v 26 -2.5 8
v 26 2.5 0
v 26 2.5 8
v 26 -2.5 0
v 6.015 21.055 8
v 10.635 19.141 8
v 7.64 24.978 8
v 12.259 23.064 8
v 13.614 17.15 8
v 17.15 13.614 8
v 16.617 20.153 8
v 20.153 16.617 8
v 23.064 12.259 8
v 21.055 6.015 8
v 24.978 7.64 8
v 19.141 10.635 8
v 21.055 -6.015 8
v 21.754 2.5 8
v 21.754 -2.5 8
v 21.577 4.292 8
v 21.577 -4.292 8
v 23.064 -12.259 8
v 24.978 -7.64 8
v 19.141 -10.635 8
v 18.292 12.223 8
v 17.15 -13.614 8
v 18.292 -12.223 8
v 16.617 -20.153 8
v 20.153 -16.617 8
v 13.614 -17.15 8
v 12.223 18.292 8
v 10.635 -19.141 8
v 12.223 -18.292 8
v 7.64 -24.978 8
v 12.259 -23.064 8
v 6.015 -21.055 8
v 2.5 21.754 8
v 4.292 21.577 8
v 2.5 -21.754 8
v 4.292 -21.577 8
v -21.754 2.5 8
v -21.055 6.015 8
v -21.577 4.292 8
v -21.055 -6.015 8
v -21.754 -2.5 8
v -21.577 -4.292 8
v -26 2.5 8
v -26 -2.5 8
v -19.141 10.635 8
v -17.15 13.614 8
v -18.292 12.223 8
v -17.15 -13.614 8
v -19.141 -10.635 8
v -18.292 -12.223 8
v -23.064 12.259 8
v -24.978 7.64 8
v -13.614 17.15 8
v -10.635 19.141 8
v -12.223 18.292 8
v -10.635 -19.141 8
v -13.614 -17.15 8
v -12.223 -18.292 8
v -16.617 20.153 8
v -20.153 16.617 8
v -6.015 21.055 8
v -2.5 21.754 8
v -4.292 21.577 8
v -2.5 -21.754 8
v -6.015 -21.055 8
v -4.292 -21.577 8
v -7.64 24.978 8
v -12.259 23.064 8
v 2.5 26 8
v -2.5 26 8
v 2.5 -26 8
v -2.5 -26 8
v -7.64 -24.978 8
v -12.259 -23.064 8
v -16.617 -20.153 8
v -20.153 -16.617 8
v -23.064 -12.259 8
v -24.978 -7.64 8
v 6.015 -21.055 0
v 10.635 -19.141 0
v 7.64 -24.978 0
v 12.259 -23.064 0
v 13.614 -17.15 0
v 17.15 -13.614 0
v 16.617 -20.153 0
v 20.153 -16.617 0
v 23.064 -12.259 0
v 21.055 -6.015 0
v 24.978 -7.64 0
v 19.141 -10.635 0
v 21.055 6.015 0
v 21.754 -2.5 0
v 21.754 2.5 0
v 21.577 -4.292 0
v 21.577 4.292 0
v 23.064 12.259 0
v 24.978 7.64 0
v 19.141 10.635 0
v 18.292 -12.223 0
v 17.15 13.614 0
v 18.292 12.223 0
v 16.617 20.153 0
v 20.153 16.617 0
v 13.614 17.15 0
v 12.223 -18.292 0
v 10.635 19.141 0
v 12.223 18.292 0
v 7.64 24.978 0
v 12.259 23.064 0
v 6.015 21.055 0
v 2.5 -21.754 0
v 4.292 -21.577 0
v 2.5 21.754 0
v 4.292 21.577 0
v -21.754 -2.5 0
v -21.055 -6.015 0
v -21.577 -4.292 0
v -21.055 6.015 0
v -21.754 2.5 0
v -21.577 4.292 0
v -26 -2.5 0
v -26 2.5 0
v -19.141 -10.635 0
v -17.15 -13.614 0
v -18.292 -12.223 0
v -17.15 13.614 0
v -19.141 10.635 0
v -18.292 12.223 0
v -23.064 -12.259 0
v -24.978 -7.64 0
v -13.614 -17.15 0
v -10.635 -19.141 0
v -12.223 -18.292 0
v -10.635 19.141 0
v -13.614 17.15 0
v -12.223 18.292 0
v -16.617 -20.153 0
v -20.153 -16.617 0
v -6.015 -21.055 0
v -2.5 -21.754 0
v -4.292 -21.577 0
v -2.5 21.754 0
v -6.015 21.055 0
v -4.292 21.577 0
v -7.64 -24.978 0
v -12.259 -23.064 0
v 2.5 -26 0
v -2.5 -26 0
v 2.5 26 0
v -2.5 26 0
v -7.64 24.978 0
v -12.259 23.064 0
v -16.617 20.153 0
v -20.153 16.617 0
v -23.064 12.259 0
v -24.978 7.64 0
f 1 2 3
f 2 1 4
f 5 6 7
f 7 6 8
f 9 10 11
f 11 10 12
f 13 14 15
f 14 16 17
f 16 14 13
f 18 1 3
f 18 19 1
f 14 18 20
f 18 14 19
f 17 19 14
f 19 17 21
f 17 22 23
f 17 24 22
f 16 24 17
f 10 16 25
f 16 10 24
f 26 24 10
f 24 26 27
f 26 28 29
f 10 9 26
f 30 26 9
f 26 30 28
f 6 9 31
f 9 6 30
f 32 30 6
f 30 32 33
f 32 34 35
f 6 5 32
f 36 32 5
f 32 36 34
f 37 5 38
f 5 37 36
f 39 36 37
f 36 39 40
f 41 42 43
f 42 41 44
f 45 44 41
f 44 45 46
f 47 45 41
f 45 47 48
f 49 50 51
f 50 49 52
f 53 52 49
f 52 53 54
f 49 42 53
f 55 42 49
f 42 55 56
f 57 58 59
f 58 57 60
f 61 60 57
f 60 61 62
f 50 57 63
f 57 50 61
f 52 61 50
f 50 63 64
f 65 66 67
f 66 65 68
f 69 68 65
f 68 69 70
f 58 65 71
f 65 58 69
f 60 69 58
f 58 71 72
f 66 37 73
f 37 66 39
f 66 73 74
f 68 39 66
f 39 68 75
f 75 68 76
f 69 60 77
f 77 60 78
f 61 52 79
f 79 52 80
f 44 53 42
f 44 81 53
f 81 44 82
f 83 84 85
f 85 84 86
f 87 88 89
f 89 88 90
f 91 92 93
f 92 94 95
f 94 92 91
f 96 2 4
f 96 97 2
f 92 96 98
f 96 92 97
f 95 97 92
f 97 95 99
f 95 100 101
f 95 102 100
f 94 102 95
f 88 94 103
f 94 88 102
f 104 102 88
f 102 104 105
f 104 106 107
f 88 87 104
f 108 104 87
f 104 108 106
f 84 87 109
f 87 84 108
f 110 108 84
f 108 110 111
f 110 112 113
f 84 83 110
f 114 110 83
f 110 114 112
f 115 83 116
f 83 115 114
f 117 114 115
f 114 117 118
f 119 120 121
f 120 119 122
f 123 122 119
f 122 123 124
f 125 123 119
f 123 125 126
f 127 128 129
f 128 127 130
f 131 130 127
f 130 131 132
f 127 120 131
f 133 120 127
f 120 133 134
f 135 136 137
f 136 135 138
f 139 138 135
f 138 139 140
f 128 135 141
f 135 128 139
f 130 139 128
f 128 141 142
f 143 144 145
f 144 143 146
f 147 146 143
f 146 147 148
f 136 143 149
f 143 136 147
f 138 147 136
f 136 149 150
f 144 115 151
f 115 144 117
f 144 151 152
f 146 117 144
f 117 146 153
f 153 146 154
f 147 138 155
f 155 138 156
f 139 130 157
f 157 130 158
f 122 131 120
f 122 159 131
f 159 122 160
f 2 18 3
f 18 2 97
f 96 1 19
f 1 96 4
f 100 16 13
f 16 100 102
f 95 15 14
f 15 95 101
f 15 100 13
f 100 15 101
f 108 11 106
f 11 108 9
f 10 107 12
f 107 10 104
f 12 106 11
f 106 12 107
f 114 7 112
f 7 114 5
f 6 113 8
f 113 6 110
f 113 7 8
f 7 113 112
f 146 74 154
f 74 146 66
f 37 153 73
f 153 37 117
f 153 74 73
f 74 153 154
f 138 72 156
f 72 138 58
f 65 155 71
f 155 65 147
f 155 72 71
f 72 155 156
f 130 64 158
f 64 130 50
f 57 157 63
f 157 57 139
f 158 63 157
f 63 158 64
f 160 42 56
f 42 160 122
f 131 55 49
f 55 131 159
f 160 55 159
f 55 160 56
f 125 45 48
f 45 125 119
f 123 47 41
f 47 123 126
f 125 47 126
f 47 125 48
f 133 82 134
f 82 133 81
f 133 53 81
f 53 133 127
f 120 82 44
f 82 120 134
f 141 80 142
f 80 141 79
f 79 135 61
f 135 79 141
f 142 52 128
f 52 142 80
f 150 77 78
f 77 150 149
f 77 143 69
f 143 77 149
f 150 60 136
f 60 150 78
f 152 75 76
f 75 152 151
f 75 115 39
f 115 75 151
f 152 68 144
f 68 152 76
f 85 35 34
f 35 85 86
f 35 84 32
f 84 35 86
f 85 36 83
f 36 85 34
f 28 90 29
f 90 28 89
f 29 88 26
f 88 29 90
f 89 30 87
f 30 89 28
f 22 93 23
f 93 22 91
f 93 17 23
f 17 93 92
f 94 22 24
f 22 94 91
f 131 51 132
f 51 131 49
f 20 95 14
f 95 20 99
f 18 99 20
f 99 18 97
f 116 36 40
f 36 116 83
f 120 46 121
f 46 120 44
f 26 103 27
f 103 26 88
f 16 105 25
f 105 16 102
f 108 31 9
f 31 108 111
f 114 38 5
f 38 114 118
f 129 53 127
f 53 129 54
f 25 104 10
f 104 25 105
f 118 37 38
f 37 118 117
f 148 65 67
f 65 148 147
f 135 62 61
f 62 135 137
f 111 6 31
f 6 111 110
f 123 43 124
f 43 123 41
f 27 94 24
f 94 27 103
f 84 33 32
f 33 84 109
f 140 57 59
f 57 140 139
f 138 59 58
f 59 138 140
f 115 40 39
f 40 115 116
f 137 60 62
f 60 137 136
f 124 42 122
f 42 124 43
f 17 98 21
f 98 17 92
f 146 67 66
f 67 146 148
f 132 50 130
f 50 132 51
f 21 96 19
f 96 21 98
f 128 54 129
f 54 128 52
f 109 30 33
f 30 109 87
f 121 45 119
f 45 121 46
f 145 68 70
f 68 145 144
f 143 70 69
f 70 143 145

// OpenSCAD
$fn = 32;

// ----------------------------------------------------------------------
// Spur blank: plain gear blank
// ----------------------------------------------------------------------

// --- parameters (mm) ---
disc_r = 22;              // blank root radius
disc_t = 8;               // blank thickness
n_teeth = 16;             // stub tooth count
tooth_w = 5;              // tooth width at the root
tooth_h = 4;              // tooth height above the root

out_r = disc_r + tooth_h;  // tip radius
bbox_x = 52.0;  // measured width over the teeth
bbox_y = 52.0;  // measured depth over the teeth

union() {
  cylinder(r = disc_r, h = disc_t);
  for (i = [0 : n_teeth - 1])
    rotate([0, 0, i * 360 / n_teeth])
      translate([disc_r - 1, -tooth_w / 2, 0])
        cube([tooth_h + 1, tooth_w, disc_t]);
}
